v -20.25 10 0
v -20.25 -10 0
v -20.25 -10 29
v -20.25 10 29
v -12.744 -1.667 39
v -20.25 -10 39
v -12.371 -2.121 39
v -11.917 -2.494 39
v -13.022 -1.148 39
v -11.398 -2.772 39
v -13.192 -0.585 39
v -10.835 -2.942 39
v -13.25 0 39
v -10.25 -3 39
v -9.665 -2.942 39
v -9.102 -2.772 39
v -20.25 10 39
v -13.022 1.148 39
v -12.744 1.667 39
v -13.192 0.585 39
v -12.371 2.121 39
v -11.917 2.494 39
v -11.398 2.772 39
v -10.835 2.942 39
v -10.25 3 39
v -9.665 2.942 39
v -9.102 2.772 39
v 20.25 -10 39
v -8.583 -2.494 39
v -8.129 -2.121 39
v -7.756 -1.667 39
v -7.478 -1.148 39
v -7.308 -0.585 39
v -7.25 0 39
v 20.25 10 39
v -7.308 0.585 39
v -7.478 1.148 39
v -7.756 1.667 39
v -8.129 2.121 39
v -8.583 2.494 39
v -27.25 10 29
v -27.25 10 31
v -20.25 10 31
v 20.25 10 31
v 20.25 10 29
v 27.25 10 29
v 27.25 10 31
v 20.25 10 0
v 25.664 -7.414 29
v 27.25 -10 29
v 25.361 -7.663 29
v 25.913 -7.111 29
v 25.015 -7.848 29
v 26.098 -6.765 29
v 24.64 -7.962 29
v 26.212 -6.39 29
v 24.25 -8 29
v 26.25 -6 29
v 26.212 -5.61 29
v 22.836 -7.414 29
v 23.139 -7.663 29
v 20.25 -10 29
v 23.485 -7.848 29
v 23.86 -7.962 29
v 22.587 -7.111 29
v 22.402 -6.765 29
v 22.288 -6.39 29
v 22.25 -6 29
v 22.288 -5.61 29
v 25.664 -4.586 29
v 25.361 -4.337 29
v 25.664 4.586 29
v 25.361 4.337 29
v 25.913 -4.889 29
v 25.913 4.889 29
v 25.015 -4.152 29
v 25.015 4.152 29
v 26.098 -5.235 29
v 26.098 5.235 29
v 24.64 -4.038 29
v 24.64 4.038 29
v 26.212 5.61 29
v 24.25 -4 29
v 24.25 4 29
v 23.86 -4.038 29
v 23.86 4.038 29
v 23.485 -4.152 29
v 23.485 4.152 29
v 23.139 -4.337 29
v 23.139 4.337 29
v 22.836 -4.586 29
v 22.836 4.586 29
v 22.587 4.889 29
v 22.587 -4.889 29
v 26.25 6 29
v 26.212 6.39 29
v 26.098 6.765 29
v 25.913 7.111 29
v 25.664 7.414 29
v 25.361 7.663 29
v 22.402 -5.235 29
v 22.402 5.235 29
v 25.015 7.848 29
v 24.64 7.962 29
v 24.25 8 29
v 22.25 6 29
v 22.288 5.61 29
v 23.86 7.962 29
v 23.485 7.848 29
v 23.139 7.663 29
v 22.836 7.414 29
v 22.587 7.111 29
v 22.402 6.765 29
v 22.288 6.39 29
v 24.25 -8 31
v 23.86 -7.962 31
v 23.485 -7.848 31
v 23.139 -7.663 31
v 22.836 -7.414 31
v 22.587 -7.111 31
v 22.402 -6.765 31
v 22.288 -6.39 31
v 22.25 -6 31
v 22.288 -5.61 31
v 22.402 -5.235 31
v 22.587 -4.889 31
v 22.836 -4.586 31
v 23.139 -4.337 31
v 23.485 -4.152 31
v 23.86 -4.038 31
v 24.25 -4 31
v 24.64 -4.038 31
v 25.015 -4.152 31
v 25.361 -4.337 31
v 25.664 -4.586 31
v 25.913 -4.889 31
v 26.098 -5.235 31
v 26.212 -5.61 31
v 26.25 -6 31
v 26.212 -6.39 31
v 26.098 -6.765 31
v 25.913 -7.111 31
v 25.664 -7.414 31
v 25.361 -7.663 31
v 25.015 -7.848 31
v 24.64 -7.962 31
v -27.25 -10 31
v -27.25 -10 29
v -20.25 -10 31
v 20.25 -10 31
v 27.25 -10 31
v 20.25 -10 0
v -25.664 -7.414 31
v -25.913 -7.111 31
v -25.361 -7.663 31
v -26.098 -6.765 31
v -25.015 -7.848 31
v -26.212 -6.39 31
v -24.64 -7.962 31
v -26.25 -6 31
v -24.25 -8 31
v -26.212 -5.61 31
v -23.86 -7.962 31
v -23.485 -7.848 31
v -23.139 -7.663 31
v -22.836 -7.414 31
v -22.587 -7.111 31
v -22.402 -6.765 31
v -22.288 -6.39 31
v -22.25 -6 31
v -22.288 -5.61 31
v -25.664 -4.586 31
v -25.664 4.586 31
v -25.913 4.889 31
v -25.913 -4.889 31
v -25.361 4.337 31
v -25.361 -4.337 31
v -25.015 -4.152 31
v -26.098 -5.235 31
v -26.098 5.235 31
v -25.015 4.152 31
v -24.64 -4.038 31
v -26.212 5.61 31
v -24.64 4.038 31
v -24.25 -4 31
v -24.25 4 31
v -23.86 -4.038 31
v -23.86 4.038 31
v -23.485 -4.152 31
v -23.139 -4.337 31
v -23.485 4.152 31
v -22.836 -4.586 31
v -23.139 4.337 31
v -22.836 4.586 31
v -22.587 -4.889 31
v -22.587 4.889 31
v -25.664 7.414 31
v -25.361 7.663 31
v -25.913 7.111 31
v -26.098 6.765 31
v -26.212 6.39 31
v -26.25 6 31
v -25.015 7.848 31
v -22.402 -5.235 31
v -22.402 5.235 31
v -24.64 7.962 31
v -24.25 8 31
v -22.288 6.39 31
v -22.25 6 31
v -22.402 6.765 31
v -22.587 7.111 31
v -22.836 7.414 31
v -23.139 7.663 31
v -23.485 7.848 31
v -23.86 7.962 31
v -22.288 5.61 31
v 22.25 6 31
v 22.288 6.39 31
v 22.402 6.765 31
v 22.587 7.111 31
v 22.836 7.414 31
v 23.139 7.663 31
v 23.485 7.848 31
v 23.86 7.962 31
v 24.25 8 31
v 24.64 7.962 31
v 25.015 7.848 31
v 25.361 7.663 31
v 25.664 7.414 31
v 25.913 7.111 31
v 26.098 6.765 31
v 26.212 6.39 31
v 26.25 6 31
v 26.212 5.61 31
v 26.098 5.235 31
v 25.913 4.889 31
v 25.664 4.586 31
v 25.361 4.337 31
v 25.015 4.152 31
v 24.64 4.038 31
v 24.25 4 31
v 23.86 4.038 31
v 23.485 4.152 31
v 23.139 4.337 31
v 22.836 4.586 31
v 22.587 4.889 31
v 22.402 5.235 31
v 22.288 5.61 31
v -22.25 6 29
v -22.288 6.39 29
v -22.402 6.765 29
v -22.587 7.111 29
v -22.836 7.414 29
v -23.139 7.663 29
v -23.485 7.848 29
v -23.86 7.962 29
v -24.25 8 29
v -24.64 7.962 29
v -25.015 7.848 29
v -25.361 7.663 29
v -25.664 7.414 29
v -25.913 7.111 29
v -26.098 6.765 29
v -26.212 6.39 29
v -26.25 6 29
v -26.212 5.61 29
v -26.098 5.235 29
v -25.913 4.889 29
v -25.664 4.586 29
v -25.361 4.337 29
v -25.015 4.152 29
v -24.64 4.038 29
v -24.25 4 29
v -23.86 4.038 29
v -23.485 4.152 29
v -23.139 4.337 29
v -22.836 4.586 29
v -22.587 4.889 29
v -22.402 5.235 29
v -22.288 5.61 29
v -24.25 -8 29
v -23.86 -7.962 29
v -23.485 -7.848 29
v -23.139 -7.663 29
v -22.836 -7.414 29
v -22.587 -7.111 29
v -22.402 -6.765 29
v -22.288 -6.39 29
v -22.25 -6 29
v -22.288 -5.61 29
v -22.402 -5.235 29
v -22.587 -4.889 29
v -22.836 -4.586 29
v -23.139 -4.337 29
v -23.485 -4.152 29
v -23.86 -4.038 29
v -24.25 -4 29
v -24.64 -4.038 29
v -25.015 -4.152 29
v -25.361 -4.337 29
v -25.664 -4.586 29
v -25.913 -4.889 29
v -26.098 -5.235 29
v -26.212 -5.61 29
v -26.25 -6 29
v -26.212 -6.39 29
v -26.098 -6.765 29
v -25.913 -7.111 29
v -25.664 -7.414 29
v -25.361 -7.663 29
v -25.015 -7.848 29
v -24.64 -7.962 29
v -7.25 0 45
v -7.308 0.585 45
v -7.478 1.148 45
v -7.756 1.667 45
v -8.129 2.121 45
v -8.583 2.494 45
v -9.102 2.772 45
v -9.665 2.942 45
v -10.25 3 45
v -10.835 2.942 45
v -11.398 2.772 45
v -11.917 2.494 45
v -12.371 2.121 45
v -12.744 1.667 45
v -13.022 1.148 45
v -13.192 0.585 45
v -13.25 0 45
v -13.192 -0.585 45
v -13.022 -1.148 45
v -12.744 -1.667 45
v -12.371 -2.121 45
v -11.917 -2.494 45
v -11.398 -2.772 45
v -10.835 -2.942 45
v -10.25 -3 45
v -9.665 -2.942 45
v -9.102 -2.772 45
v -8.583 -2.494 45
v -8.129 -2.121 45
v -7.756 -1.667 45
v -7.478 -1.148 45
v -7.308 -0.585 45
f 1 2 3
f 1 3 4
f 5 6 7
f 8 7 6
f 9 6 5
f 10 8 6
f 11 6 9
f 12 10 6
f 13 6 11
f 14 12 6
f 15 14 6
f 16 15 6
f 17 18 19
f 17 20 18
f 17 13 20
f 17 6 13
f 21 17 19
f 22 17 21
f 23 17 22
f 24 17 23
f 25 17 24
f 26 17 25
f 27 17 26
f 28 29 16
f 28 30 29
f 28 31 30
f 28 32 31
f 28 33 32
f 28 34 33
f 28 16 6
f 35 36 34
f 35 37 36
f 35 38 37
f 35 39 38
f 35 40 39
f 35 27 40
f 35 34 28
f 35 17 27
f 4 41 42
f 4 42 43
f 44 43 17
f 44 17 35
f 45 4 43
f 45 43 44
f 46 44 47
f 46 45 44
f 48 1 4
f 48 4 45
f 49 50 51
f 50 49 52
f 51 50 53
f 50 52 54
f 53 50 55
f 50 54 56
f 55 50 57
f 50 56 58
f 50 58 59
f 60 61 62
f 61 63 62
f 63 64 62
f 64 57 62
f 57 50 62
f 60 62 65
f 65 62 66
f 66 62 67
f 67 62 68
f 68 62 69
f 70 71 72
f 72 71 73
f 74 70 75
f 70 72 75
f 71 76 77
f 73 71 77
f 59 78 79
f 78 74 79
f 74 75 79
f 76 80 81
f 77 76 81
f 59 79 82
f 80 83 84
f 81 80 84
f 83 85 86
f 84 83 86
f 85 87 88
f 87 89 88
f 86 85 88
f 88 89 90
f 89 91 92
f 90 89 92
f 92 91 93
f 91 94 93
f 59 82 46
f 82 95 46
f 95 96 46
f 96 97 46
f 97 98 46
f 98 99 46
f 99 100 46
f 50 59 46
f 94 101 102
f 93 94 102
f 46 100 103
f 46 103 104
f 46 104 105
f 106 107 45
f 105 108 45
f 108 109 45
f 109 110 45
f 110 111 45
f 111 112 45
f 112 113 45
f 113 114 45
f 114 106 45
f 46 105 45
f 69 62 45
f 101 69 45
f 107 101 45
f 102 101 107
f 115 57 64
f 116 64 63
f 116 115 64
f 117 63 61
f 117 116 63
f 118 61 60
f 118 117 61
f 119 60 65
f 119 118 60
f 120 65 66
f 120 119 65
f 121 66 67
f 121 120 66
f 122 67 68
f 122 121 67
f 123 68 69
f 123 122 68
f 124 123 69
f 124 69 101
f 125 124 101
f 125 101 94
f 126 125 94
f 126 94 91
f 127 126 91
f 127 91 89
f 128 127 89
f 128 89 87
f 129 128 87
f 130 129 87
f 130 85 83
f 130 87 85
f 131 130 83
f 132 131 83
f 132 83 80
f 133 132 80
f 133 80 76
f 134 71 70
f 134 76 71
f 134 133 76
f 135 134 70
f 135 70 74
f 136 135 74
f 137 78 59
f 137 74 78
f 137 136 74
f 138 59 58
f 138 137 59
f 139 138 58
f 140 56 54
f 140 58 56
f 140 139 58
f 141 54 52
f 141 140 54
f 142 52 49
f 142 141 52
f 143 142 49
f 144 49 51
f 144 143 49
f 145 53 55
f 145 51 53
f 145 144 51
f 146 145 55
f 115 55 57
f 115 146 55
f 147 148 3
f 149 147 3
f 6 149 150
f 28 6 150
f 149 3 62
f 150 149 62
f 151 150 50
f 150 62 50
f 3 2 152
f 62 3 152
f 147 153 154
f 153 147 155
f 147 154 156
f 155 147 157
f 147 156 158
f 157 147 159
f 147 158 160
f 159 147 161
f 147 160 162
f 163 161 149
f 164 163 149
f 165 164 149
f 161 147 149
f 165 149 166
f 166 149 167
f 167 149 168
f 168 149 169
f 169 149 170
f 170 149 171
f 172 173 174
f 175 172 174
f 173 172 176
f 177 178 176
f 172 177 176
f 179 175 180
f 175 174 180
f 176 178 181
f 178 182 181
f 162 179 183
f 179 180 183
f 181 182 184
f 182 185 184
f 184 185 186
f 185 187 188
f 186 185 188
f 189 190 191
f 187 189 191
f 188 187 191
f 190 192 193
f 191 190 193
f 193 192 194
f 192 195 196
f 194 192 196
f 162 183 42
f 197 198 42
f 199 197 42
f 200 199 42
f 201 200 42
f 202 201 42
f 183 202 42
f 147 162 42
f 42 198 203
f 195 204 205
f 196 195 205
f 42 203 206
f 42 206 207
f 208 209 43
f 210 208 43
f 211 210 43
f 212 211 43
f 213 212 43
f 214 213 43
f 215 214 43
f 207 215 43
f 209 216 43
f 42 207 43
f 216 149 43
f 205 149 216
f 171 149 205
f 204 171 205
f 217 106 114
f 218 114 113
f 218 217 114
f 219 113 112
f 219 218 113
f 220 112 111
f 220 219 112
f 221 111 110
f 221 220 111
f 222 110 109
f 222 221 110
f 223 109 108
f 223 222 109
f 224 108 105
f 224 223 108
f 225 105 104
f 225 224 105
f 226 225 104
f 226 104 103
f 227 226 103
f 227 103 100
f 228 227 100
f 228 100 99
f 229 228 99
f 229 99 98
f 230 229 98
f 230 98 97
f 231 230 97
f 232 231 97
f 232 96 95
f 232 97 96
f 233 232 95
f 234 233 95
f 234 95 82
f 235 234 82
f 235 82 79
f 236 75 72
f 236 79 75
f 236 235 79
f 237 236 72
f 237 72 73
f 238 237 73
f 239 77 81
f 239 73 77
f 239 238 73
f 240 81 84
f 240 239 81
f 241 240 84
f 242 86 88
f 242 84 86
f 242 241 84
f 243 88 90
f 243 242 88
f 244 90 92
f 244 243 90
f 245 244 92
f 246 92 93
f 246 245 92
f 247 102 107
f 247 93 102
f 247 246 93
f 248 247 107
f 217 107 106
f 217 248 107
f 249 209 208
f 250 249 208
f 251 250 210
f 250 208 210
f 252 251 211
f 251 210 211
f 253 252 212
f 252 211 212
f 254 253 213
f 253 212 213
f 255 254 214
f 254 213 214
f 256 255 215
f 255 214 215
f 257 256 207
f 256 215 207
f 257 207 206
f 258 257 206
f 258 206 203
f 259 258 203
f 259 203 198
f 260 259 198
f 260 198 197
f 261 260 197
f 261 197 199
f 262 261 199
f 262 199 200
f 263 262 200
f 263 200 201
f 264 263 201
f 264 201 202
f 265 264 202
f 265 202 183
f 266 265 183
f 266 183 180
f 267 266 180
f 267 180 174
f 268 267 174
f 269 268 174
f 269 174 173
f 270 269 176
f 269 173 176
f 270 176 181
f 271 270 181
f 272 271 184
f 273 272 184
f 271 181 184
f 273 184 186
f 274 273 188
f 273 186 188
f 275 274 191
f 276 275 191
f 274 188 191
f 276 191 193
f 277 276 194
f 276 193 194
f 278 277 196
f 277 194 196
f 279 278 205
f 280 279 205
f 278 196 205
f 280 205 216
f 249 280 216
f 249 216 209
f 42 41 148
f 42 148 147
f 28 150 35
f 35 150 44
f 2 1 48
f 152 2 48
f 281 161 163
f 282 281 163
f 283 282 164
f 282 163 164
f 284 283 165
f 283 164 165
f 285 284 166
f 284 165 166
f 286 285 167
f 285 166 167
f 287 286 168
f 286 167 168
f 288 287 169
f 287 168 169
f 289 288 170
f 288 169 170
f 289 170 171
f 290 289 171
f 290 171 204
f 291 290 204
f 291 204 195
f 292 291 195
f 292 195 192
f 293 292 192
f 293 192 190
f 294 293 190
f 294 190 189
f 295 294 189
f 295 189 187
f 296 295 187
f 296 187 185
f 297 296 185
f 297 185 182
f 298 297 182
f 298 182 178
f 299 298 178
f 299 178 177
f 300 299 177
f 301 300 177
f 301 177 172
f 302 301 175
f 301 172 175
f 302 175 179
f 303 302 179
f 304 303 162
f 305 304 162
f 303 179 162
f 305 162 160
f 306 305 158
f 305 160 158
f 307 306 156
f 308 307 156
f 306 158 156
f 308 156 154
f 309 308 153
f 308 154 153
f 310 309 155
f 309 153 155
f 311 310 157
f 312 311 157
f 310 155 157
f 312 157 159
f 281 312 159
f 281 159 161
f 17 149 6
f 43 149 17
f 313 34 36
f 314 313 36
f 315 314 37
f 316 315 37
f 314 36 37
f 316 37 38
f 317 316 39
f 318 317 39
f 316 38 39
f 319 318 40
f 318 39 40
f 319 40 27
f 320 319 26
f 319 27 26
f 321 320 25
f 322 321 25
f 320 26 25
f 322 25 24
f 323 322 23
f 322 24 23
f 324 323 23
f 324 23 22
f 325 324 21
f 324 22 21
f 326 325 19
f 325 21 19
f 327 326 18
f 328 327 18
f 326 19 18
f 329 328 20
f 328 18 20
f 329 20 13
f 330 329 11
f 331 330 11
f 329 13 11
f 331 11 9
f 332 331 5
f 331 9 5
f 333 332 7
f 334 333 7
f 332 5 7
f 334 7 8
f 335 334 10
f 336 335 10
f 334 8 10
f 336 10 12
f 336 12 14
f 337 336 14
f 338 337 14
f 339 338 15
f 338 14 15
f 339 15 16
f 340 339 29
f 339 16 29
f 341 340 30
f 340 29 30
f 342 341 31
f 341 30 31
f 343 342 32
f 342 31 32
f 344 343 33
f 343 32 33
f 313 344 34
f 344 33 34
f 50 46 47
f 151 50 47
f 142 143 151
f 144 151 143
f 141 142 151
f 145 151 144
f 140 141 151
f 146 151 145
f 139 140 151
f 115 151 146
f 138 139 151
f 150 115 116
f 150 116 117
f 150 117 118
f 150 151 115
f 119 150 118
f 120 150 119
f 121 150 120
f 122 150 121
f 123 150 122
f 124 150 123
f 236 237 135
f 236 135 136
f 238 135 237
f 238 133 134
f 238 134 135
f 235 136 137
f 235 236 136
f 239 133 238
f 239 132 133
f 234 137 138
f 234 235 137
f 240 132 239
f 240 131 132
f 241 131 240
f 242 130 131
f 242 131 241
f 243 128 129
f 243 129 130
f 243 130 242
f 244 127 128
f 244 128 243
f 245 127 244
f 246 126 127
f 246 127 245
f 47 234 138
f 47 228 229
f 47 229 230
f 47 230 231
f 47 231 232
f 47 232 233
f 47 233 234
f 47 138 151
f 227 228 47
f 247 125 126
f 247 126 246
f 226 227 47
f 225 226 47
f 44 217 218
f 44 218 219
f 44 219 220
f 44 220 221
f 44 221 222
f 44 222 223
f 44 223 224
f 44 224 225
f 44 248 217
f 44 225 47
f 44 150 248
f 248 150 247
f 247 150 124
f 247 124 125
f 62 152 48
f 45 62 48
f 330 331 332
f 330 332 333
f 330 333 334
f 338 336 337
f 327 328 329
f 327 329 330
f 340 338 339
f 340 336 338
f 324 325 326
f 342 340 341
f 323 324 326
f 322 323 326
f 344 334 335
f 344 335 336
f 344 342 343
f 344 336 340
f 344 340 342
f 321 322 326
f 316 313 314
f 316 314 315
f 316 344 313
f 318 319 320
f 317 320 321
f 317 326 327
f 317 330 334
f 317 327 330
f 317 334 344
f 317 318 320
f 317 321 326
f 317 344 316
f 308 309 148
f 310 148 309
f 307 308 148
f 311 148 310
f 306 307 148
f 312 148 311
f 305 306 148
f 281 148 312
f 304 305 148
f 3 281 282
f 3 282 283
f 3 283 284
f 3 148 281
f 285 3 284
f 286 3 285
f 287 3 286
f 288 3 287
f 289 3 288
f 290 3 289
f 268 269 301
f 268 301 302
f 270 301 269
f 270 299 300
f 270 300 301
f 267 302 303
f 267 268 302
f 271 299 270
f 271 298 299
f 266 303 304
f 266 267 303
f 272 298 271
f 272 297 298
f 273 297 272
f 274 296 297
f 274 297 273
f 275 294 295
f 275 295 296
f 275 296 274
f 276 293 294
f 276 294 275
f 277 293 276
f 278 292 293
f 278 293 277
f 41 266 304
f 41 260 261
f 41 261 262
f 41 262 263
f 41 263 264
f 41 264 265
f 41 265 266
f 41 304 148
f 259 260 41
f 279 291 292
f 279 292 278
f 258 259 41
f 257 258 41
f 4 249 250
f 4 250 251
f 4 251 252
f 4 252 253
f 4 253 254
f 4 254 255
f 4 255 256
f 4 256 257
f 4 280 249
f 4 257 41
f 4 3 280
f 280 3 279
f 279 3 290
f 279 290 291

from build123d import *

# Parameters (mm, degrees)
SKETCH1_W           = 40.5
SKETCH1_H           = 20
BOSS_EXTRUDE1_DEPTH = 39
SKETCH2_R           = 3
BOSS_EXTRUDE2_DEPTH = 6
SKETCH3_W           = 2
SKETCH3_H           = 20
BOSS_EXTRUDE3_DEPTH = 7
SKETCH4_R           = 2
CUT_EXTRUDE1_DEPTH  = 7


with BuildPart() as part:
    # Sketch1 → Boss-Extrude1 (new body)
    with BuildSketch(Plane.XY):
        Rectangle(SKETCH1_W, SKETCH1_H)
    extrude(amount=BOSS_EXTRUDE1_DEPTH)

    # Sketch2 → Boss-Extrude2 (add)
    with BuildSketch(Plane.XY.offset(39)):
        with Locations((-10.25, 0)):
            Circle(SKETCH2_R)
    extrude(amount=BOSS_EXTRUDE2_DEPTH)

    # Sketch3 → Boss-Extrude3 (add)
    with BuildSketch(Plane.ZY.offset(20.25)):
        with Locations((30, 0)):
            Rectangle(SKETCH3_W, SKETCH3_H)
    boss_extrude3 = extrude(amount=BOSS_EXTRUDE3_DEPTH)

    # Sketch4 → Cut-Extrude1 (cut)
    with BuildSketch(Plane.XY.offset(31)):
        with Locations((-24.25, 6)):
            Circle(SKETCH4_R)
        with Locations(Location((-24.25, -6, 0), (0, 0, 270))):
            Circle(SKETCH4_R)
    cut_extrude1 = extrude(amount=-CUT_EXTRUDE1_DEPTH, mode=Mode.SUBTRACT)

    # Mirror1: Boss-Extrude3, Cut-Extrude1 across plane
    add(boss_extrude3.mirror(Plane(origin=(0, 0, 0), x_dir=(0, 0, 1), z_dir=(1, 0, 0))))
    add(cut_extrude1.mirror(Plane(origin=(0, 0, 0), x_dir=(0, 0, 1), z_dir=(1, 0, 0))), mode=Mode.SUBTRACT)


solid = part.part
